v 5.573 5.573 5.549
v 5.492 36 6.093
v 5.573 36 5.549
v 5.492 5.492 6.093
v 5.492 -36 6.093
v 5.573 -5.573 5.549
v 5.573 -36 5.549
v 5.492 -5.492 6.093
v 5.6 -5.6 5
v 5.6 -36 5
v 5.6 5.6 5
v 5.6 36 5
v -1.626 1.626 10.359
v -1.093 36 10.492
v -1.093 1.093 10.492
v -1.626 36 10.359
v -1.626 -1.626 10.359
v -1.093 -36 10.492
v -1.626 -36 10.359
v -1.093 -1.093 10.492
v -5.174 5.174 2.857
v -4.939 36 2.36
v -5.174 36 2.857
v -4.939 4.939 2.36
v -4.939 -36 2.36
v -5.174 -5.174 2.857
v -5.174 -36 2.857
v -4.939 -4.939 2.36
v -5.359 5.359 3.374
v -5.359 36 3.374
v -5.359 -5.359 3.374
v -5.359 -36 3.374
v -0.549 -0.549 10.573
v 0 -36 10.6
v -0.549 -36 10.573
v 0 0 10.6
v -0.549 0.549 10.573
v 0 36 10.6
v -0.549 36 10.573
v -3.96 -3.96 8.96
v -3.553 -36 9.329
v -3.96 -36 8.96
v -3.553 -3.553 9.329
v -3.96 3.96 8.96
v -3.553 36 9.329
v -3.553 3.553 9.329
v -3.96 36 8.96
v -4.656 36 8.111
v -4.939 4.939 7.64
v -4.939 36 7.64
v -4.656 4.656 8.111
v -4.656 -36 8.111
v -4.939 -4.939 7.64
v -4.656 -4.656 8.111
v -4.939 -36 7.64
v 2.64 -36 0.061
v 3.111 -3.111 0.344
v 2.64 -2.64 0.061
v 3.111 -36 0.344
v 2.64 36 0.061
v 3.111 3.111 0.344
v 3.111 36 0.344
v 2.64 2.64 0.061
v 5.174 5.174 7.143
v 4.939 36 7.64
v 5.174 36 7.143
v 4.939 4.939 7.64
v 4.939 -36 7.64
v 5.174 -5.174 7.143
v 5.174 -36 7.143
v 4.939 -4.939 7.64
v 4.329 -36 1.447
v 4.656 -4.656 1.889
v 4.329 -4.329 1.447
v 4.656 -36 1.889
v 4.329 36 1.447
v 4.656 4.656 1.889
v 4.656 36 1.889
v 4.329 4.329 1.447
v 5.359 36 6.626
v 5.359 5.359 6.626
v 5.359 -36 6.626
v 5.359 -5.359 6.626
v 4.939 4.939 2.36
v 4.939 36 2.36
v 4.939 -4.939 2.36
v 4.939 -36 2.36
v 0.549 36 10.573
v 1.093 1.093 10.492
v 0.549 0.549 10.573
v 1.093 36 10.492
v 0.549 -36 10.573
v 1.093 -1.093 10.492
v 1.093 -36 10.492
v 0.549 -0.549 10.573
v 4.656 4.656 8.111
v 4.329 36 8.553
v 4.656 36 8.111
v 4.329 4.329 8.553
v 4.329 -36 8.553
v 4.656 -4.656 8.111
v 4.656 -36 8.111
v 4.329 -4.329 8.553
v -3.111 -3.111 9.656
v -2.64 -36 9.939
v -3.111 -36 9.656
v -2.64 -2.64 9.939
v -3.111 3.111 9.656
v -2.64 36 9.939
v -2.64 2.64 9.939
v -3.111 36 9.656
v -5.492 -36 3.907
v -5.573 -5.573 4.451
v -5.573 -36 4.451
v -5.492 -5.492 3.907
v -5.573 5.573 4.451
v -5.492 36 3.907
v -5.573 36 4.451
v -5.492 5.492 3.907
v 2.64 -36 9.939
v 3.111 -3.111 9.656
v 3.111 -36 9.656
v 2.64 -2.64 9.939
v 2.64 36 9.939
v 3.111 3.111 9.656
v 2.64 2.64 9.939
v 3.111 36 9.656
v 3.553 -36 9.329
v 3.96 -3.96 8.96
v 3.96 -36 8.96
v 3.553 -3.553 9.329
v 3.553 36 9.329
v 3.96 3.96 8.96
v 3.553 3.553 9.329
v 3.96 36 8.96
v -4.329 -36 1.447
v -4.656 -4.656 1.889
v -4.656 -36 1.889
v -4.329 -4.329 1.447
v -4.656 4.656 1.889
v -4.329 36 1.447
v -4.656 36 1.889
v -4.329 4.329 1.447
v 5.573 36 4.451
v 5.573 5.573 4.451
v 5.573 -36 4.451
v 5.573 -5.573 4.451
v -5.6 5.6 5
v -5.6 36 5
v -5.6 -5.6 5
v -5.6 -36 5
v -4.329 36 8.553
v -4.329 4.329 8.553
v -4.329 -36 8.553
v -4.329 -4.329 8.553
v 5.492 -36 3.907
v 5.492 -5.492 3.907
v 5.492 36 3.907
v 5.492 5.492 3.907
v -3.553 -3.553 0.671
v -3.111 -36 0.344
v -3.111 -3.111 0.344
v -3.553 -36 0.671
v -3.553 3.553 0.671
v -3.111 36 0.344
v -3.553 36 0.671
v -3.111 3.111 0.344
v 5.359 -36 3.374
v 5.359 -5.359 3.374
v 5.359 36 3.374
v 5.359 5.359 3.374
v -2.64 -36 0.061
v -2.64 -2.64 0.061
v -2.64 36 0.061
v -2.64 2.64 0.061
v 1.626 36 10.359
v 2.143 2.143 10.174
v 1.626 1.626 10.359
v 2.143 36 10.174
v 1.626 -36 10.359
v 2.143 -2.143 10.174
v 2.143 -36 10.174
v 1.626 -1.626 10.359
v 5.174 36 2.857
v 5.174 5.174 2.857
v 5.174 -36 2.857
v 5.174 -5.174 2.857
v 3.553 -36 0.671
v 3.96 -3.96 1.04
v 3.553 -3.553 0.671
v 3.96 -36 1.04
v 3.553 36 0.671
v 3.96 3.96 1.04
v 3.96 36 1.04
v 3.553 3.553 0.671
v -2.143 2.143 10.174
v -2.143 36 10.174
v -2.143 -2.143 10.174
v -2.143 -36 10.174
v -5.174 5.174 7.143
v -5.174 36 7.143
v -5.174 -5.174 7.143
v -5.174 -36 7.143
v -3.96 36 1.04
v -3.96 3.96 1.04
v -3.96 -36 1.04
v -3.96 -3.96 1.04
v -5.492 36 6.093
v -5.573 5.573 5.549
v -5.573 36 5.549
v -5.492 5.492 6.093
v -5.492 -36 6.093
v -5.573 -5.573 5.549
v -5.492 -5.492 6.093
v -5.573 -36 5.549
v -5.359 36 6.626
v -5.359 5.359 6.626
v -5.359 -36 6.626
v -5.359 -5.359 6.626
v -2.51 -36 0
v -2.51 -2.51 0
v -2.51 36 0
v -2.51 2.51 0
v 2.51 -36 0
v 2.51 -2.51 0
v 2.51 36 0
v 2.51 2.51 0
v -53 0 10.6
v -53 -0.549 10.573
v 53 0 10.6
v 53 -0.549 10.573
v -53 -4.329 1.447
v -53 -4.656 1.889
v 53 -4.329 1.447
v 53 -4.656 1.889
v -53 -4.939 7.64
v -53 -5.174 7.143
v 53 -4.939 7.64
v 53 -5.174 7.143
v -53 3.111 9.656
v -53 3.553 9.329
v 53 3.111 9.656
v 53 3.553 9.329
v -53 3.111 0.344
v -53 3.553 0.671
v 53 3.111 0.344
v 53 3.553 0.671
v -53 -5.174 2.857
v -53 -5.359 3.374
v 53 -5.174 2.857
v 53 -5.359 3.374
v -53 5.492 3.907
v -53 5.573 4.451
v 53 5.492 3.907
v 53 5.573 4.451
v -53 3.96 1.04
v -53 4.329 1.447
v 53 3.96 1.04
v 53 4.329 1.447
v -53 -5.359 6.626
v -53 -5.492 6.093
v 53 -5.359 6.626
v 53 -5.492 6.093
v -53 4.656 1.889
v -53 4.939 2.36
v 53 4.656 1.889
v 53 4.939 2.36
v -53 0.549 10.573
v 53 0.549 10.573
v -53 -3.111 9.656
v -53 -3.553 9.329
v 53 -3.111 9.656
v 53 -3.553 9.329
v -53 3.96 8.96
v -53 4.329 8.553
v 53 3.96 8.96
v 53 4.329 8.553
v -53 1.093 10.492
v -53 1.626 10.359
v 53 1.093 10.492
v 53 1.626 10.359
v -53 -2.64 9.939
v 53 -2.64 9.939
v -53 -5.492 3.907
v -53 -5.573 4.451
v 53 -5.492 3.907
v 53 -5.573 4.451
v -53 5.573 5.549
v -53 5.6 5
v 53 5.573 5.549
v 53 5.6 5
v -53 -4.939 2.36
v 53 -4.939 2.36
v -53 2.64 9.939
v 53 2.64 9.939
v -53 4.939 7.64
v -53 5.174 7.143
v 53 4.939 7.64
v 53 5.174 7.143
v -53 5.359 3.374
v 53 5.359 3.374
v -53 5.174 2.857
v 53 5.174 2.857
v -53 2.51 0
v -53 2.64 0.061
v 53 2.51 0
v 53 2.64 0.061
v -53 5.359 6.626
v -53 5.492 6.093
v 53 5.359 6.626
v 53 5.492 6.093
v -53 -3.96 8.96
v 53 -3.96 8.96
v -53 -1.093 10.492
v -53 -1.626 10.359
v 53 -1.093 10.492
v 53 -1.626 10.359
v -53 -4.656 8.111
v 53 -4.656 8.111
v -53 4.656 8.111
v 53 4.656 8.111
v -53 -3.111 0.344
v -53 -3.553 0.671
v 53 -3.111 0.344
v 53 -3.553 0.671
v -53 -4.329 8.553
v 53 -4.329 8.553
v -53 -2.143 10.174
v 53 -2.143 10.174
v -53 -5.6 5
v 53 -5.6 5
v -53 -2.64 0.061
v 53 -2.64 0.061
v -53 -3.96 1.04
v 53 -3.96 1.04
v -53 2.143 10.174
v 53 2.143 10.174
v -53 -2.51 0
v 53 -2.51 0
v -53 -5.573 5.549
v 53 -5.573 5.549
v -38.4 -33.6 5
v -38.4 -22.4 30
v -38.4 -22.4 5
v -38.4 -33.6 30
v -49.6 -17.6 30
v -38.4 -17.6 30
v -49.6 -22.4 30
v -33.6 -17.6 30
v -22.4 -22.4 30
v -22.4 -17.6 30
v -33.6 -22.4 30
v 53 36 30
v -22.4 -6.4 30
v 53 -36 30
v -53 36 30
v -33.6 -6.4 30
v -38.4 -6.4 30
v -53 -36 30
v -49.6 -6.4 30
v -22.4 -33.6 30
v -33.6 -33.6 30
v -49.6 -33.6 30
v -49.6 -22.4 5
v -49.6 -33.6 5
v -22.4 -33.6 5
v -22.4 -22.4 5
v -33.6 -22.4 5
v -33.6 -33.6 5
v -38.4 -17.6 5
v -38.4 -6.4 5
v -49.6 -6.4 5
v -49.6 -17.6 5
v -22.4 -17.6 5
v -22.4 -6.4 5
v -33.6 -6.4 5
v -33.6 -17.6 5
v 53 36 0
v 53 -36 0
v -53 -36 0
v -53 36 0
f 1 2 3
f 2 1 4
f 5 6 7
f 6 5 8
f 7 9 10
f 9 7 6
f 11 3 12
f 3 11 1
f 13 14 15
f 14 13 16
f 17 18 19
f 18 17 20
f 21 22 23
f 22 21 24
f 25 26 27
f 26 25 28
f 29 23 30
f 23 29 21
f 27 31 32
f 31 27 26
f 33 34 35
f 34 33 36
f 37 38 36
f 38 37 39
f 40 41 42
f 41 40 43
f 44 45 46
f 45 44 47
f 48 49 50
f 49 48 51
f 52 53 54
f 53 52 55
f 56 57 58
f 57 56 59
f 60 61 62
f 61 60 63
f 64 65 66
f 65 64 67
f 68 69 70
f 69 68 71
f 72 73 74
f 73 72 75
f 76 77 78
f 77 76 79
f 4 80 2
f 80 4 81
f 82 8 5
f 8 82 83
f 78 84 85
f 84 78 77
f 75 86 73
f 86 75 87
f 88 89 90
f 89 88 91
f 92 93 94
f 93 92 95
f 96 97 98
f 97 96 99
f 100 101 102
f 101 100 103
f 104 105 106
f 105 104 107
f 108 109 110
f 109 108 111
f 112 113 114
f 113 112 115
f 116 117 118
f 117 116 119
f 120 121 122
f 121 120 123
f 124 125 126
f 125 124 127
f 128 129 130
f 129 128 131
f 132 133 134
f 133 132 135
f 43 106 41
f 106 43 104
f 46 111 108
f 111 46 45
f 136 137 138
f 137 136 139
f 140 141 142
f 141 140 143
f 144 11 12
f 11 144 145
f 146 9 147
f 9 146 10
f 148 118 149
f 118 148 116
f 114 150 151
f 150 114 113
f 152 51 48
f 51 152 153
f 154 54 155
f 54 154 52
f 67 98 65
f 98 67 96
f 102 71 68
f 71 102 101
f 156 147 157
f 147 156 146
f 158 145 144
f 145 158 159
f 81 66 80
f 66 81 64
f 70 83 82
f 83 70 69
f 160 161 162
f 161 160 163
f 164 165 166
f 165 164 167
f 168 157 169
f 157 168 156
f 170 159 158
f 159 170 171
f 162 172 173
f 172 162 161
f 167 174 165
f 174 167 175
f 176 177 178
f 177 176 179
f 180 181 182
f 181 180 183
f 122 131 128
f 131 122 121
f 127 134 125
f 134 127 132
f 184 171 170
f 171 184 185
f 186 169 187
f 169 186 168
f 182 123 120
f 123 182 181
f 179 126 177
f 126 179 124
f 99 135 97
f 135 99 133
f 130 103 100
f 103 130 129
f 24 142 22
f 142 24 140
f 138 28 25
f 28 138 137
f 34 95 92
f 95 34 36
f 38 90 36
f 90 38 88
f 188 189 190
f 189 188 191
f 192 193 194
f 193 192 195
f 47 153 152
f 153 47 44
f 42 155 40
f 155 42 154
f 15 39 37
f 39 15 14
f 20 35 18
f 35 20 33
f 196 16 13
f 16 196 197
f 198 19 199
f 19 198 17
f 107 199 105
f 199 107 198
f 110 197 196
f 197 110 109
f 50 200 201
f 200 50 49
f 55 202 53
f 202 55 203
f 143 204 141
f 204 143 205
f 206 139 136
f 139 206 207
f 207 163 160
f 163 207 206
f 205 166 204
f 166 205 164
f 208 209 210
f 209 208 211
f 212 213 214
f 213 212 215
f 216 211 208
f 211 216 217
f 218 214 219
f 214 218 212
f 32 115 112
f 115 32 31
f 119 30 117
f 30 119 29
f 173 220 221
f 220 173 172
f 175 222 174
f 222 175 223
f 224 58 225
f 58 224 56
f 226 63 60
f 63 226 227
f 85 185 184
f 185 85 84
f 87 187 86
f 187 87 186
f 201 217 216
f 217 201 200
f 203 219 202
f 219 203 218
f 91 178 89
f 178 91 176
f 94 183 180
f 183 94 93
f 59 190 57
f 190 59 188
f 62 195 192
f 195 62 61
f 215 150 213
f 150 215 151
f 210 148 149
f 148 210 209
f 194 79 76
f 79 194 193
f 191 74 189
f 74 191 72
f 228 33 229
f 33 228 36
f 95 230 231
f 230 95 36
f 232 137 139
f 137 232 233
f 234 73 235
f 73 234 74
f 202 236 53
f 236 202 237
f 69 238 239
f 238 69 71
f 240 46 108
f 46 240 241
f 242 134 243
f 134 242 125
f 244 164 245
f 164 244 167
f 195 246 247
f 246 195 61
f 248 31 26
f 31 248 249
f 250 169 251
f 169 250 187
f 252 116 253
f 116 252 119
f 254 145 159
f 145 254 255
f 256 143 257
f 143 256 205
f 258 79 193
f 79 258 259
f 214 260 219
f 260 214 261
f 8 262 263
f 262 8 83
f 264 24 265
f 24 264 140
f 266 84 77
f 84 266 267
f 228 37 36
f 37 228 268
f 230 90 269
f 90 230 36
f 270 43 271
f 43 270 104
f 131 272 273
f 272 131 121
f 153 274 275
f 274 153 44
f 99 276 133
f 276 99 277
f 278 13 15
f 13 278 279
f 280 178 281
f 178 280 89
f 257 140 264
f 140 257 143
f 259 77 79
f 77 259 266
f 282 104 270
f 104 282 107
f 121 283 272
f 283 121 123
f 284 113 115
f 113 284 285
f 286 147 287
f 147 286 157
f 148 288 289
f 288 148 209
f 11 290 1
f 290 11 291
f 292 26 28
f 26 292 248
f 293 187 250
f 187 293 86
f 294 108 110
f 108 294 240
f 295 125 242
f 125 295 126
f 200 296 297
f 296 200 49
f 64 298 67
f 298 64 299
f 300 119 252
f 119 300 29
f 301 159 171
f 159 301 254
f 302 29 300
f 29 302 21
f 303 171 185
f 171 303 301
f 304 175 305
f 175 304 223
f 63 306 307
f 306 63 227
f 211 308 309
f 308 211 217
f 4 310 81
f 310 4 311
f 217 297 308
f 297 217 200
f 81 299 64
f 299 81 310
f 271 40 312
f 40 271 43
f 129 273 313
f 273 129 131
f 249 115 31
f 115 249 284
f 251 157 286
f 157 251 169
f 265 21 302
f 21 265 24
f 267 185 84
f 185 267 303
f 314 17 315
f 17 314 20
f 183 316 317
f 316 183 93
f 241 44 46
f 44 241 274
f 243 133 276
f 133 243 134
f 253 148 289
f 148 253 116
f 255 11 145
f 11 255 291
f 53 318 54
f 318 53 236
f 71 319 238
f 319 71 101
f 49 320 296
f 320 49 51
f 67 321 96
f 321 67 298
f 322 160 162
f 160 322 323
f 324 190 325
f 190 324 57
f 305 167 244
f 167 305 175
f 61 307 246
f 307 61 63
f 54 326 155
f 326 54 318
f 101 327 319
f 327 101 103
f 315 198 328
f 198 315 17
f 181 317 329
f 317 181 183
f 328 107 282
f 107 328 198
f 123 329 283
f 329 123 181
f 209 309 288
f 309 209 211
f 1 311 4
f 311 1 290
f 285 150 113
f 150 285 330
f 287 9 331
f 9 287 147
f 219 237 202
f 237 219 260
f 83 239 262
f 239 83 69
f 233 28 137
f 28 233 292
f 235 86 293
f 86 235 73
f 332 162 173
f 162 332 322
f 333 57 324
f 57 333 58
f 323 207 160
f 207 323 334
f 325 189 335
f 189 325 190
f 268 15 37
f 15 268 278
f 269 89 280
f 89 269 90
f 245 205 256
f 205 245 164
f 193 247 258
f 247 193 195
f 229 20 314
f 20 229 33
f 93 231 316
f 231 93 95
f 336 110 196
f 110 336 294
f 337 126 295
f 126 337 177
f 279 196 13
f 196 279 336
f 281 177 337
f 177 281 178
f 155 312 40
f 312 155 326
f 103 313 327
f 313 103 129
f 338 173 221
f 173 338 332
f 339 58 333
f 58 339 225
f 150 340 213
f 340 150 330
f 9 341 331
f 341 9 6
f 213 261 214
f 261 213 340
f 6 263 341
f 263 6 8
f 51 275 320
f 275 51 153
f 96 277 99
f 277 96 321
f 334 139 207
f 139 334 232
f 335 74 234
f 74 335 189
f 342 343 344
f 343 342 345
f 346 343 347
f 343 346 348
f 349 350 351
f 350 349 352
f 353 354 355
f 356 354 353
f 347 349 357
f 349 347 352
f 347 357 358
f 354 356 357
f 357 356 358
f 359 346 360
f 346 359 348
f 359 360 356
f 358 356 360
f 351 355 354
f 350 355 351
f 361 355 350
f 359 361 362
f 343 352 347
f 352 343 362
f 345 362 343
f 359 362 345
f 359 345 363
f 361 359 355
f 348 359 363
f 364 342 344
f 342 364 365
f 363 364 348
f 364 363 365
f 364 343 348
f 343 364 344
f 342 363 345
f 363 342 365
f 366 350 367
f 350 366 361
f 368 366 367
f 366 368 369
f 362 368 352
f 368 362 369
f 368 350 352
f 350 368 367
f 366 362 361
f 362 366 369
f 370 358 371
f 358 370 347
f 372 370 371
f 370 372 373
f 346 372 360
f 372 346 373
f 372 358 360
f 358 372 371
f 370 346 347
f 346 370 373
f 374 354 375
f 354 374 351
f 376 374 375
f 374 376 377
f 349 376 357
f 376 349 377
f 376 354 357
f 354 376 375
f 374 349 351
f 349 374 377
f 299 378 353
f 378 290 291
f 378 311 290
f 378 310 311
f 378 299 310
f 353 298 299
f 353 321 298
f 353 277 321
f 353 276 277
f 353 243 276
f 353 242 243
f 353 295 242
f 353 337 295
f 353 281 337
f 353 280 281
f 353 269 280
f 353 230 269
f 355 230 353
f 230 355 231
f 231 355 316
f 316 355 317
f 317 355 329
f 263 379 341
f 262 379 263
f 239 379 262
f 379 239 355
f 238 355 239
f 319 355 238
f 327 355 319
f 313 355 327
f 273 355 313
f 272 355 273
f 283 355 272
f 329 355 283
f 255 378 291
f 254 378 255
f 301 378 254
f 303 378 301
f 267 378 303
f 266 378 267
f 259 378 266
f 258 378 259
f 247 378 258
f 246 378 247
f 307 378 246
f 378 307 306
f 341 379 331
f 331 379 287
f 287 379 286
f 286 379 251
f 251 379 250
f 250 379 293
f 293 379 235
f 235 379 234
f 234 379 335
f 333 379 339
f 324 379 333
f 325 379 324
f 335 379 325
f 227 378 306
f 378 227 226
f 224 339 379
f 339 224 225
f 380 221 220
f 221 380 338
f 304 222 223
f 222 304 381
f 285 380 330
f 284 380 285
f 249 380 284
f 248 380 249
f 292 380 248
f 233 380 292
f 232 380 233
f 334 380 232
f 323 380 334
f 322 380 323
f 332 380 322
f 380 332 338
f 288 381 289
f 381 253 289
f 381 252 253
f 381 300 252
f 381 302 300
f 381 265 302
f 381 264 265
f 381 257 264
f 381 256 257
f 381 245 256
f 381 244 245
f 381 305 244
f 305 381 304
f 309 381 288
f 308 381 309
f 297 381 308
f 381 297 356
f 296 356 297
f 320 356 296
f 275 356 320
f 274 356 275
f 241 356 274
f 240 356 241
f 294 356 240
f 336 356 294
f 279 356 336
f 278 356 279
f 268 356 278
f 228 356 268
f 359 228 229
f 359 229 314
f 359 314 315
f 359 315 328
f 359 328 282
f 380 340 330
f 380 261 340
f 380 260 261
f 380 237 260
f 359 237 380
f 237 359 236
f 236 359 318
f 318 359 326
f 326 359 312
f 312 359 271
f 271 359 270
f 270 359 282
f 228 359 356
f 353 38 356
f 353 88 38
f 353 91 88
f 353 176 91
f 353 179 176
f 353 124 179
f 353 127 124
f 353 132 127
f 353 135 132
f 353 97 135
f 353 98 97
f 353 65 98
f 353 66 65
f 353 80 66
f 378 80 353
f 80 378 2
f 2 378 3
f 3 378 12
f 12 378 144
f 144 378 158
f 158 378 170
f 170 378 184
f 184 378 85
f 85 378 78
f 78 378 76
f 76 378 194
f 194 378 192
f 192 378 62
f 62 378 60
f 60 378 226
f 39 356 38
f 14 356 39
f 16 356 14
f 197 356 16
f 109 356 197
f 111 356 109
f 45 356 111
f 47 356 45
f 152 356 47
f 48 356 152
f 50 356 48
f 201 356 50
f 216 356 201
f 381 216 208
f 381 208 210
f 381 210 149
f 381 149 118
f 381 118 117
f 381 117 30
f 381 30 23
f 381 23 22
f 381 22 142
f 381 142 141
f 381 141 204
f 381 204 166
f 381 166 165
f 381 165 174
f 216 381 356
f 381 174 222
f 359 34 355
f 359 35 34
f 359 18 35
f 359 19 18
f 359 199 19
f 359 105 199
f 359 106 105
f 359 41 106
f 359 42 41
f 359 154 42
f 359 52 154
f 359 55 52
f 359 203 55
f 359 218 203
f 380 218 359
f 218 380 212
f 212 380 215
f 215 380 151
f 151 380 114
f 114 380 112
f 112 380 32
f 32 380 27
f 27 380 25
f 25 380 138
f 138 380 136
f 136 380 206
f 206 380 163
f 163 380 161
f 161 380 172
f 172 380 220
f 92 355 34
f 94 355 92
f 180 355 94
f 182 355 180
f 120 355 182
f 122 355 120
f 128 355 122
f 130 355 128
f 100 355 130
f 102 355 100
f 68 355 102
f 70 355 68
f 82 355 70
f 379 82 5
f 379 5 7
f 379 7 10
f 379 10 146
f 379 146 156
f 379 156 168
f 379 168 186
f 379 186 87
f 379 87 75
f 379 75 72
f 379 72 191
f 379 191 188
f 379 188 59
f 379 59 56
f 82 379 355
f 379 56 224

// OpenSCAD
// Built by bench/smallmodels/features/compiler.py from a list of features.
$fn = 64;
difference() {
  union() {
    translate([0, 0, 0]) translate([-53, -36, 0]) cube([106, 72, 30]);
  }
  union() {
    translate([0, 0, 5]) rotate([0, 0, 0]) rotate([90, 0, 0]) cylinder(d = 11.2, h = 1120, center = true);
    translate([0, 0, 5]) rotate([0, 0, 0]) rotate([0, 90, 0]) cylinder(d = 11.2, h = 1120, center = true);
    translate([-108, -60, 5]) rotate([0, 0, 0]) translate([-5.6, -5.6, 0]) cube([11.2, 11.2, 25]);
    translate([-92, -60, 5]) rotate([0, 0, 0]) translate([-5.6, -5.6, 0]) cube([11.2, 11.2, 25]);
    translate([-76, -60, 5]) rotate([0, 0, 0]) translate([-5.6, -5.6, 0]) cube([11.2, 11.2, 25]);
    translate([-60, -60, 5]) rotate([0, 0, 0]) translate([-5.6, -5.6, 0]) cube([11.2, 11.2, 25]);
    translate([-44, -60, 5]) rotate([0, 0, 0]) translate([-5.6, -5.6, 0]) cube([11.2, 11.2, 25]);
    translate([-28, -60, 5]) rotate([0, 0, 0]) translate([-5.6, -5.6, 0]) cube([11.2, 11.2, 25]);
    translate([-108, -44, 5]) rotate([0, 0, 0]) translate([-5.6, -5.6, 0]) cube([11.2, 11.2, 25]);
    translate([-92, -44, 5]) rotate([0, 0, 0]) translate([-5.6, -5.6, 0]) cube([11.2, 11.2, 25]);
    translate([-76, -44, 5]) rotate([0, 0, 0]) translate([-5.6, -5.6, 0]) cube([11.2, 11.2, 25]);
    translate([-60, -44, 5]) rotate([0, 0, 0]) translate([-5.6, -5.6, 0]) cube([11.2, 11.2, 25]);
    translate([-44, -44, 5]) rotate([0, 0, 0]) translate([-5.6, -5.6, 0]) cube([11.2, 11.2, 25]);
    translate([-28, -44, 5]) rotate([0, 0, 0]) translate([-5.6, -5.6, 0]) cube([11.2, 11.2, 25]);
    translate([-108, -28, 5]) rotate([0, 0, 0]) translate([-5.6, -5.6, 0]) cube([11.2, 11.2, 25]);
    translate([-92, -28, 5]) rotate([0, 0, 0]) translate([-5.6, -5.6, 0]) cube([11.2, 11.2, 25]);
    translate([-76, -28, 5]) rotate([0, 0, 0]) translate([-5.6, -5.6, 0]) cube([11.2, 11.2, 25]);
    translate([-60, -28, 5]) rotate([0, 0, 0]) translate([-5.6, -5.6, 0]) cube([11.2, 11.2, 25]);
    translate([-44, -28, 5]) rotate([0, 0, 0]) translate([-5.6, -5.6, 0]) cube([11.2, 11.2, 25]);
    translate([-28, -28, 5]) rotate([0, 0, 0]) translate([-5.6, -5.6, 0]) cube([11.2, 11.2, 25]);
    translate([-108, -12, 5]) rotate([0, 0, 0]) translate([-5.6, -5.6, 0]) cube([11.2, 11.2, 25]);
    translate([-92, -12, 5]) rotate([0, 0, 0]) translate([-5.6, -5.6, 0]) cube([11.2, 11.2, 25]);
    translate([-76, -12, 5]) rotate([0, 0, 0]) translate([-5.6, -5.6, 0]) cube([11.2, 11.2, 25]);
    translate([-60, -12, 5]) rotate([0, 0, 0]) translate([-5.6, -5.6, 0]) cube([11.2, 11.2, 25]);
    translate([-44, -12, 5]) rotate([0, 0, 0]) translate([-5.6, -5.6, 0]) cube([11.2, 11.2, 25]);
    translate([-28, -12, 5]) rotate([0, 0, 0]) translate([-5.6, -5.6, 0]) cube([11.2, 11.2, 25]);
  }
}
